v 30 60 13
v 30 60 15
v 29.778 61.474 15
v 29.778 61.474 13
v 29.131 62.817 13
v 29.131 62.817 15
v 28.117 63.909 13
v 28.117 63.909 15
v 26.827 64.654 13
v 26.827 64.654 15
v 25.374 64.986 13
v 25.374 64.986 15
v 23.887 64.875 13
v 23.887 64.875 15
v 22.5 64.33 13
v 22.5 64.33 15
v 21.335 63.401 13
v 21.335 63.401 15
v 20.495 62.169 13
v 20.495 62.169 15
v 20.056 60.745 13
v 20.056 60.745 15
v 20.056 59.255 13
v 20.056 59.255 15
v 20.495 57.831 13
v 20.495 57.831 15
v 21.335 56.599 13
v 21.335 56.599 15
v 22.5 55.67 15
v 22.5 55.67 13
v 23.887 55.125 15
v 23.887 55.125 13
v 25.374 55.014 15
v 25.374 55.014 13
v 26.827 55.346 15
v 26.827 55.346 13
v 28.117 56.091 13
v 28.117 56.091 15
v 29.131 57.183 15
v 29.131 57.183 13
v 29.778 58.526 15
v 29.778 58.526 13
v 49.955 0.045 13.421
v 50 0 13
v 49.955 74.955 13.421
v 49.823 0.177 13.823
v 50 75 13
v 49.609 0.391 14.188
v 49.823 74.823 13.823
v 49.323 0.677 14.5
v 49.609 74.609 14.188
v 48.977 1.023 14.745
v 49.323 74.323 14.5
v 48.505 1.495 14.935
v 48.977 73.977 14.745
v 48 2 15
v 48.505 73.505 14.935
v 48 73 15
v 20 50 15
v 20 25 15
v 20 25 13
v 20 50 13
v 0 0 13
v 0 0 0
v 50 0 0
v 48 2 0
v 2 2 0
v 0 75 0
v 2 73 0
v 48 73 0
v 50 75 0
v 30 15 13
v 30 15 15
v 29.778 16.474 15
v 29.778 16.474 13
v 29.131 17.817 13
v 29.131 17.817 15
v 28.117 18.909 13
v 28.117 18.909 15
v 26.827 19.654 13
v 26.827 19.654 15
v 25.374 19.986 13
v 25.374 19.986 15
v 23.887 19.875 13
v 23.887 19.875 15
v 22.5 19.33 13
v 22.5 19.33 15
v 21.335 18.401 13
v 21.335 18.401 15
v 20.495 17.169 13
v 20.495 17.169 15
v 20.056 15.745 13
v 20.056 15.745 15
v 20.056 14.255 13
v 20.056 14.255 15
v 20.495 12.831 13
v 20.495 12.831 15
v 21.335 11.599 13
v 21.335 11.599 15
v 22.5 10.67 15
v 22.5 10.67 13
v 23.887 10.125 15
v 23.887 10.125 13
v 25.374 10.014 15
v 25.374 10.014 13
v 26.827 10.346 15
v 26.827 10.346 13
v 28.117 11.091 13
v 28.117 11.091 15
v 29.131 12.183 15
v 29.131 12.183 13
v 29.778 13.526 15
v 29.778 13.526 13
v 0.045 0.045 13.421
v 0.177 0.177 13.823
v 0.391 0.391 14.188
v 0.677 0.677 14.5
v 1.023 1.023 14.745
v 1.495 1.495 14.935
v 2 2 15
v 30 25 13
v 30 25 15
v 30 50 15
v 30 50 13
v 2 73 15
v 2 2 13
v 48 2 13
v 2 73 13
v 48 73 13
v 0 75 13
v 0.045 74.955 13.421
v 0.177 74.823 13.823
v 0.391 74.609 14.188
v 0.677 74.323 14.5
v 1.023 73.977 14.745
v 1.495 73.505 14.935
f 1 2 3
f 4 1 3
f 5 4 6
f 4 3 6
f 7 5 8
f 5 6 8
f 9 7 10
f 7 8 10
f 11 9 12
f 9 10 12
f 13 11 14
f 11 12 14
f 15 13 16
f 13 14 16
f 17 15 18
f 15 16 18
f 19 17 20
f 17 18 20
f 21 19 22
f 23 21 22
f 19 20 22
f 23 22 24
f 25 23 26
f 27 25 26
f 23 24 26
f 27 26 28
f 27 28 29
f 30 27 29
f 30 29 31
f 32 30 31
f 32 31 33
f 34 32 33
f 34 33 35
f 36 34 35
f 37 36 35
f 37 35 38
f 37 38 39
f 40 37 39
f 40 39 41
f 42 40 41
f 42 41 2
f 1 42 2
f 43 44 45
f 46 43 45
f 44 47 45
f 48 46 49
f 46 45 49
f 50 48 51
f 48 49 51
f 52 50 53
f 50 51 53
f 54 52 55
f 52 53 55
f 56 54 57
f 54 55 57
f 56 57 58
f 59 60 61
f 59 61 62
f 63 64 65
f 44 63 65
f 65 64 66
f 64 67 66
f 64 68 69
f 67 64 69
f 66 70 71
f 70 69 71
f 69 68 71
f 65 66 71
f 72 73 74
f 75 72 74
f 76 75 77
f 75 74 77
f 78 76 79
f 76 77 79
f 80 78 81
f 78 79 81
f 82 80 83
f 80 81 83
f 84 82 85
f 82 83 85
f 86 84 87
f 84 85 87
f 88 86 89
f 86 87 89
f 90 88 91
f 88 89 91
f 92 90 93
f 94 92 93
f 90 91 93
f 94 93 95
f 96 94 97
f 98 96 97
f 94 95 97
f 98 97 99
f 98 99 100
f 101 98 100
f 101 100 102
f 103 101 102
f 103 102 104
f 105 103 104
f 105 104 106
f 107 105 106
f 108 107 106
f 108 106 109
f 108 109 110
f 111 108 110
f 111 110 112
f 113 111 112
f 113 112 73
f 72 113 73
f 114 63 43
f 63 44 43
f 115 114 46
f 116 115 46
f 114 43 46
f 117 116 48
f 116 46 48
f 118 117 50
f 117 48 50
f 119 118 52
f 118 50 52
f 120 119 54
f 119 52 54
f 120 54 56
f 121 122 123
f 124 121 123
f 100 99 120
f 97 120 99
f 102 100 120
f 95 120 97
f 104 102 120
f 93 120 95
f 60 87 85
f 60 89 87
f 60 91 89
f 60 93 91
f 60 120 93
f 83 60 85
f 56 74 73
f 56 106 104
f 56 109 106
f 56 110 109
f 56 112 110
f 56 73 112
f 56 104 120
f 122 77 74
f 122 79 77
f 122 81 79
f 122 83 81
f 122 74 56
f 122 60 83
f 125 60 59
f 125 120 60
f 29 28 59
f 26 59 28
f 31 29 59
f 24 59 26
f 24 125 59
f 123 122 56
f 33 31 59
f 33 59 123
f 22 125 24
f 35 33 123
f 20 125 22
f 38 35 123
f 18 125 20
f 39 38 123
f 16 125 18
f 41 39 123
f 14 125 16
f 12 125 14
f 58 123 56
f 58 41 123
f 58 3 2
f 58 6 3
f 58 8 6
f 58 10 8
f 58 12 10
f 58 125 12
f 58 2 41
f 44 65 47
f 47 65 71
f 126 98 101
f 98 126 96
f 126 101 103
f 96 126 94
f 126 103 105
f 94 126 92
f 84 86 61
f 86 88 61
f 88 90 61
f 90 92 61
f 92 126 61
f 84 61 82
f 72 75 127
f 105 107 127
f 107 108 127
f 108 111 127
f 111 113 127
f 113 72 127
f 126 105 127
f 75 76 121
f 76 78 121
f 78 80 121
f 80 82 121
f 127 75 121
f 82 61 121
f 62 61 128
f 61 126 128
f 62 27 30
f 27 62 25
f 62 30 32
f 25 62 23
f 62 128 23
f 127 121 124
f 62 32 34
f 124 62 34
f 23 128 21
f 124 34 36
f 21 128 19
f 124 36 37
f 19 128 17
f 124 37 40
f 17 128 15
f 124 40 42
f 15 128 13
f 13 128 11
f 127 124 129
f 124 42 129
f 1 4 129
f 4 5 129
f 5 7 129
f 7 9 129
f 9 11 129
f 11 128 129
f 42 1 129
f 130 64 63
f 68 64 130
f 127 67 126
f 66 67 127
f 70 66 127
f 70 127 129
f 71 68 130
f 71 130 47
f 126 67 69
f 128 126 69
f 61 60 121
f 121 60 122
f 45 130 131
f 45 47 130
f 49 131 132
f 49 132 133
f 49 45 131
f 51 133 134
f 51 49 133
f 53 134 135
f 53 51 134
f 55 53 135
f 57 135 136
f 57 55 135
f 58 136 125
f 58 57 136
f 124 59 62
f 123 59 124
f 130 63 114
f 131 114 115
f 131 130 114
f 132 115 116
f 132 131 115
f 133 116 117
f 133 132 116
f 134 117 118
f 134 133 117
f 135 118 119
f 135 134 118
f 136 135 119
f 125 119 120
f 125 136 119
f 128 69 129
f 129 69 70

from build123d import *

# Parameters (mm, degrees)
SKETCH1_W           = 50
SKETCH1_H           = 75
BOSS_EXTRUDE1_DEPTH = 15
SHELL3_T            = -2
FILLET1_R           = 2
SKETCH2_R           = 5
SKETCH2_W           = 10
SKETCH2_H           = 25
CUT_EXTRUDE1_DEPTH  = 16


with BuildPart() as part:
    # Sketch1 → Boss-Extrude1 (new body)
    with BuildSketch(Plane.XY):
        with Locations((25, 37.5)):
            Rectangle(SKETCH1_W, SKETCH1_H)
    extrude(amount=BOSS_EXTRUDE1_DEPTH)

    # Shell3
    shell3_openings = [part.faces().sort_by_distance(p)[0] for p in [
        (25, 37.5, 0),
    ]]
    offset(amount=SHELL3_T, openings=shell3_openings, kind=Kind.INTERSECTION)

    # Fillet1
    fillet1_edges = [part.edges().sort_by_distance(p)[0] for p in [
        (50, 37.5, 15),
        (25, 75, 15),
        (0, 37.5, 15),
        (25, 0, 15),
    ]]
    fillet(fillet1_edges, radius=FILLET1_R)

    # Sketch2 → Cut-Extrude1 (cut, through all)
    with BuildSketch(Plane.XY.offset(15)):
        with Locations((25, 60)):
            Circle(SKETCH2_R)
        with Locations((25, 15)):
            Circle(SKETCH2_R)
        with Locations((25, 37.5)):
            Rectangle(SKETCH2_W, SKETCH2_H)
    extrude(amount=-CUT_EXTRUDE1_DEPTH, mode=Mode.SUBTRACT)


solid = part.part
